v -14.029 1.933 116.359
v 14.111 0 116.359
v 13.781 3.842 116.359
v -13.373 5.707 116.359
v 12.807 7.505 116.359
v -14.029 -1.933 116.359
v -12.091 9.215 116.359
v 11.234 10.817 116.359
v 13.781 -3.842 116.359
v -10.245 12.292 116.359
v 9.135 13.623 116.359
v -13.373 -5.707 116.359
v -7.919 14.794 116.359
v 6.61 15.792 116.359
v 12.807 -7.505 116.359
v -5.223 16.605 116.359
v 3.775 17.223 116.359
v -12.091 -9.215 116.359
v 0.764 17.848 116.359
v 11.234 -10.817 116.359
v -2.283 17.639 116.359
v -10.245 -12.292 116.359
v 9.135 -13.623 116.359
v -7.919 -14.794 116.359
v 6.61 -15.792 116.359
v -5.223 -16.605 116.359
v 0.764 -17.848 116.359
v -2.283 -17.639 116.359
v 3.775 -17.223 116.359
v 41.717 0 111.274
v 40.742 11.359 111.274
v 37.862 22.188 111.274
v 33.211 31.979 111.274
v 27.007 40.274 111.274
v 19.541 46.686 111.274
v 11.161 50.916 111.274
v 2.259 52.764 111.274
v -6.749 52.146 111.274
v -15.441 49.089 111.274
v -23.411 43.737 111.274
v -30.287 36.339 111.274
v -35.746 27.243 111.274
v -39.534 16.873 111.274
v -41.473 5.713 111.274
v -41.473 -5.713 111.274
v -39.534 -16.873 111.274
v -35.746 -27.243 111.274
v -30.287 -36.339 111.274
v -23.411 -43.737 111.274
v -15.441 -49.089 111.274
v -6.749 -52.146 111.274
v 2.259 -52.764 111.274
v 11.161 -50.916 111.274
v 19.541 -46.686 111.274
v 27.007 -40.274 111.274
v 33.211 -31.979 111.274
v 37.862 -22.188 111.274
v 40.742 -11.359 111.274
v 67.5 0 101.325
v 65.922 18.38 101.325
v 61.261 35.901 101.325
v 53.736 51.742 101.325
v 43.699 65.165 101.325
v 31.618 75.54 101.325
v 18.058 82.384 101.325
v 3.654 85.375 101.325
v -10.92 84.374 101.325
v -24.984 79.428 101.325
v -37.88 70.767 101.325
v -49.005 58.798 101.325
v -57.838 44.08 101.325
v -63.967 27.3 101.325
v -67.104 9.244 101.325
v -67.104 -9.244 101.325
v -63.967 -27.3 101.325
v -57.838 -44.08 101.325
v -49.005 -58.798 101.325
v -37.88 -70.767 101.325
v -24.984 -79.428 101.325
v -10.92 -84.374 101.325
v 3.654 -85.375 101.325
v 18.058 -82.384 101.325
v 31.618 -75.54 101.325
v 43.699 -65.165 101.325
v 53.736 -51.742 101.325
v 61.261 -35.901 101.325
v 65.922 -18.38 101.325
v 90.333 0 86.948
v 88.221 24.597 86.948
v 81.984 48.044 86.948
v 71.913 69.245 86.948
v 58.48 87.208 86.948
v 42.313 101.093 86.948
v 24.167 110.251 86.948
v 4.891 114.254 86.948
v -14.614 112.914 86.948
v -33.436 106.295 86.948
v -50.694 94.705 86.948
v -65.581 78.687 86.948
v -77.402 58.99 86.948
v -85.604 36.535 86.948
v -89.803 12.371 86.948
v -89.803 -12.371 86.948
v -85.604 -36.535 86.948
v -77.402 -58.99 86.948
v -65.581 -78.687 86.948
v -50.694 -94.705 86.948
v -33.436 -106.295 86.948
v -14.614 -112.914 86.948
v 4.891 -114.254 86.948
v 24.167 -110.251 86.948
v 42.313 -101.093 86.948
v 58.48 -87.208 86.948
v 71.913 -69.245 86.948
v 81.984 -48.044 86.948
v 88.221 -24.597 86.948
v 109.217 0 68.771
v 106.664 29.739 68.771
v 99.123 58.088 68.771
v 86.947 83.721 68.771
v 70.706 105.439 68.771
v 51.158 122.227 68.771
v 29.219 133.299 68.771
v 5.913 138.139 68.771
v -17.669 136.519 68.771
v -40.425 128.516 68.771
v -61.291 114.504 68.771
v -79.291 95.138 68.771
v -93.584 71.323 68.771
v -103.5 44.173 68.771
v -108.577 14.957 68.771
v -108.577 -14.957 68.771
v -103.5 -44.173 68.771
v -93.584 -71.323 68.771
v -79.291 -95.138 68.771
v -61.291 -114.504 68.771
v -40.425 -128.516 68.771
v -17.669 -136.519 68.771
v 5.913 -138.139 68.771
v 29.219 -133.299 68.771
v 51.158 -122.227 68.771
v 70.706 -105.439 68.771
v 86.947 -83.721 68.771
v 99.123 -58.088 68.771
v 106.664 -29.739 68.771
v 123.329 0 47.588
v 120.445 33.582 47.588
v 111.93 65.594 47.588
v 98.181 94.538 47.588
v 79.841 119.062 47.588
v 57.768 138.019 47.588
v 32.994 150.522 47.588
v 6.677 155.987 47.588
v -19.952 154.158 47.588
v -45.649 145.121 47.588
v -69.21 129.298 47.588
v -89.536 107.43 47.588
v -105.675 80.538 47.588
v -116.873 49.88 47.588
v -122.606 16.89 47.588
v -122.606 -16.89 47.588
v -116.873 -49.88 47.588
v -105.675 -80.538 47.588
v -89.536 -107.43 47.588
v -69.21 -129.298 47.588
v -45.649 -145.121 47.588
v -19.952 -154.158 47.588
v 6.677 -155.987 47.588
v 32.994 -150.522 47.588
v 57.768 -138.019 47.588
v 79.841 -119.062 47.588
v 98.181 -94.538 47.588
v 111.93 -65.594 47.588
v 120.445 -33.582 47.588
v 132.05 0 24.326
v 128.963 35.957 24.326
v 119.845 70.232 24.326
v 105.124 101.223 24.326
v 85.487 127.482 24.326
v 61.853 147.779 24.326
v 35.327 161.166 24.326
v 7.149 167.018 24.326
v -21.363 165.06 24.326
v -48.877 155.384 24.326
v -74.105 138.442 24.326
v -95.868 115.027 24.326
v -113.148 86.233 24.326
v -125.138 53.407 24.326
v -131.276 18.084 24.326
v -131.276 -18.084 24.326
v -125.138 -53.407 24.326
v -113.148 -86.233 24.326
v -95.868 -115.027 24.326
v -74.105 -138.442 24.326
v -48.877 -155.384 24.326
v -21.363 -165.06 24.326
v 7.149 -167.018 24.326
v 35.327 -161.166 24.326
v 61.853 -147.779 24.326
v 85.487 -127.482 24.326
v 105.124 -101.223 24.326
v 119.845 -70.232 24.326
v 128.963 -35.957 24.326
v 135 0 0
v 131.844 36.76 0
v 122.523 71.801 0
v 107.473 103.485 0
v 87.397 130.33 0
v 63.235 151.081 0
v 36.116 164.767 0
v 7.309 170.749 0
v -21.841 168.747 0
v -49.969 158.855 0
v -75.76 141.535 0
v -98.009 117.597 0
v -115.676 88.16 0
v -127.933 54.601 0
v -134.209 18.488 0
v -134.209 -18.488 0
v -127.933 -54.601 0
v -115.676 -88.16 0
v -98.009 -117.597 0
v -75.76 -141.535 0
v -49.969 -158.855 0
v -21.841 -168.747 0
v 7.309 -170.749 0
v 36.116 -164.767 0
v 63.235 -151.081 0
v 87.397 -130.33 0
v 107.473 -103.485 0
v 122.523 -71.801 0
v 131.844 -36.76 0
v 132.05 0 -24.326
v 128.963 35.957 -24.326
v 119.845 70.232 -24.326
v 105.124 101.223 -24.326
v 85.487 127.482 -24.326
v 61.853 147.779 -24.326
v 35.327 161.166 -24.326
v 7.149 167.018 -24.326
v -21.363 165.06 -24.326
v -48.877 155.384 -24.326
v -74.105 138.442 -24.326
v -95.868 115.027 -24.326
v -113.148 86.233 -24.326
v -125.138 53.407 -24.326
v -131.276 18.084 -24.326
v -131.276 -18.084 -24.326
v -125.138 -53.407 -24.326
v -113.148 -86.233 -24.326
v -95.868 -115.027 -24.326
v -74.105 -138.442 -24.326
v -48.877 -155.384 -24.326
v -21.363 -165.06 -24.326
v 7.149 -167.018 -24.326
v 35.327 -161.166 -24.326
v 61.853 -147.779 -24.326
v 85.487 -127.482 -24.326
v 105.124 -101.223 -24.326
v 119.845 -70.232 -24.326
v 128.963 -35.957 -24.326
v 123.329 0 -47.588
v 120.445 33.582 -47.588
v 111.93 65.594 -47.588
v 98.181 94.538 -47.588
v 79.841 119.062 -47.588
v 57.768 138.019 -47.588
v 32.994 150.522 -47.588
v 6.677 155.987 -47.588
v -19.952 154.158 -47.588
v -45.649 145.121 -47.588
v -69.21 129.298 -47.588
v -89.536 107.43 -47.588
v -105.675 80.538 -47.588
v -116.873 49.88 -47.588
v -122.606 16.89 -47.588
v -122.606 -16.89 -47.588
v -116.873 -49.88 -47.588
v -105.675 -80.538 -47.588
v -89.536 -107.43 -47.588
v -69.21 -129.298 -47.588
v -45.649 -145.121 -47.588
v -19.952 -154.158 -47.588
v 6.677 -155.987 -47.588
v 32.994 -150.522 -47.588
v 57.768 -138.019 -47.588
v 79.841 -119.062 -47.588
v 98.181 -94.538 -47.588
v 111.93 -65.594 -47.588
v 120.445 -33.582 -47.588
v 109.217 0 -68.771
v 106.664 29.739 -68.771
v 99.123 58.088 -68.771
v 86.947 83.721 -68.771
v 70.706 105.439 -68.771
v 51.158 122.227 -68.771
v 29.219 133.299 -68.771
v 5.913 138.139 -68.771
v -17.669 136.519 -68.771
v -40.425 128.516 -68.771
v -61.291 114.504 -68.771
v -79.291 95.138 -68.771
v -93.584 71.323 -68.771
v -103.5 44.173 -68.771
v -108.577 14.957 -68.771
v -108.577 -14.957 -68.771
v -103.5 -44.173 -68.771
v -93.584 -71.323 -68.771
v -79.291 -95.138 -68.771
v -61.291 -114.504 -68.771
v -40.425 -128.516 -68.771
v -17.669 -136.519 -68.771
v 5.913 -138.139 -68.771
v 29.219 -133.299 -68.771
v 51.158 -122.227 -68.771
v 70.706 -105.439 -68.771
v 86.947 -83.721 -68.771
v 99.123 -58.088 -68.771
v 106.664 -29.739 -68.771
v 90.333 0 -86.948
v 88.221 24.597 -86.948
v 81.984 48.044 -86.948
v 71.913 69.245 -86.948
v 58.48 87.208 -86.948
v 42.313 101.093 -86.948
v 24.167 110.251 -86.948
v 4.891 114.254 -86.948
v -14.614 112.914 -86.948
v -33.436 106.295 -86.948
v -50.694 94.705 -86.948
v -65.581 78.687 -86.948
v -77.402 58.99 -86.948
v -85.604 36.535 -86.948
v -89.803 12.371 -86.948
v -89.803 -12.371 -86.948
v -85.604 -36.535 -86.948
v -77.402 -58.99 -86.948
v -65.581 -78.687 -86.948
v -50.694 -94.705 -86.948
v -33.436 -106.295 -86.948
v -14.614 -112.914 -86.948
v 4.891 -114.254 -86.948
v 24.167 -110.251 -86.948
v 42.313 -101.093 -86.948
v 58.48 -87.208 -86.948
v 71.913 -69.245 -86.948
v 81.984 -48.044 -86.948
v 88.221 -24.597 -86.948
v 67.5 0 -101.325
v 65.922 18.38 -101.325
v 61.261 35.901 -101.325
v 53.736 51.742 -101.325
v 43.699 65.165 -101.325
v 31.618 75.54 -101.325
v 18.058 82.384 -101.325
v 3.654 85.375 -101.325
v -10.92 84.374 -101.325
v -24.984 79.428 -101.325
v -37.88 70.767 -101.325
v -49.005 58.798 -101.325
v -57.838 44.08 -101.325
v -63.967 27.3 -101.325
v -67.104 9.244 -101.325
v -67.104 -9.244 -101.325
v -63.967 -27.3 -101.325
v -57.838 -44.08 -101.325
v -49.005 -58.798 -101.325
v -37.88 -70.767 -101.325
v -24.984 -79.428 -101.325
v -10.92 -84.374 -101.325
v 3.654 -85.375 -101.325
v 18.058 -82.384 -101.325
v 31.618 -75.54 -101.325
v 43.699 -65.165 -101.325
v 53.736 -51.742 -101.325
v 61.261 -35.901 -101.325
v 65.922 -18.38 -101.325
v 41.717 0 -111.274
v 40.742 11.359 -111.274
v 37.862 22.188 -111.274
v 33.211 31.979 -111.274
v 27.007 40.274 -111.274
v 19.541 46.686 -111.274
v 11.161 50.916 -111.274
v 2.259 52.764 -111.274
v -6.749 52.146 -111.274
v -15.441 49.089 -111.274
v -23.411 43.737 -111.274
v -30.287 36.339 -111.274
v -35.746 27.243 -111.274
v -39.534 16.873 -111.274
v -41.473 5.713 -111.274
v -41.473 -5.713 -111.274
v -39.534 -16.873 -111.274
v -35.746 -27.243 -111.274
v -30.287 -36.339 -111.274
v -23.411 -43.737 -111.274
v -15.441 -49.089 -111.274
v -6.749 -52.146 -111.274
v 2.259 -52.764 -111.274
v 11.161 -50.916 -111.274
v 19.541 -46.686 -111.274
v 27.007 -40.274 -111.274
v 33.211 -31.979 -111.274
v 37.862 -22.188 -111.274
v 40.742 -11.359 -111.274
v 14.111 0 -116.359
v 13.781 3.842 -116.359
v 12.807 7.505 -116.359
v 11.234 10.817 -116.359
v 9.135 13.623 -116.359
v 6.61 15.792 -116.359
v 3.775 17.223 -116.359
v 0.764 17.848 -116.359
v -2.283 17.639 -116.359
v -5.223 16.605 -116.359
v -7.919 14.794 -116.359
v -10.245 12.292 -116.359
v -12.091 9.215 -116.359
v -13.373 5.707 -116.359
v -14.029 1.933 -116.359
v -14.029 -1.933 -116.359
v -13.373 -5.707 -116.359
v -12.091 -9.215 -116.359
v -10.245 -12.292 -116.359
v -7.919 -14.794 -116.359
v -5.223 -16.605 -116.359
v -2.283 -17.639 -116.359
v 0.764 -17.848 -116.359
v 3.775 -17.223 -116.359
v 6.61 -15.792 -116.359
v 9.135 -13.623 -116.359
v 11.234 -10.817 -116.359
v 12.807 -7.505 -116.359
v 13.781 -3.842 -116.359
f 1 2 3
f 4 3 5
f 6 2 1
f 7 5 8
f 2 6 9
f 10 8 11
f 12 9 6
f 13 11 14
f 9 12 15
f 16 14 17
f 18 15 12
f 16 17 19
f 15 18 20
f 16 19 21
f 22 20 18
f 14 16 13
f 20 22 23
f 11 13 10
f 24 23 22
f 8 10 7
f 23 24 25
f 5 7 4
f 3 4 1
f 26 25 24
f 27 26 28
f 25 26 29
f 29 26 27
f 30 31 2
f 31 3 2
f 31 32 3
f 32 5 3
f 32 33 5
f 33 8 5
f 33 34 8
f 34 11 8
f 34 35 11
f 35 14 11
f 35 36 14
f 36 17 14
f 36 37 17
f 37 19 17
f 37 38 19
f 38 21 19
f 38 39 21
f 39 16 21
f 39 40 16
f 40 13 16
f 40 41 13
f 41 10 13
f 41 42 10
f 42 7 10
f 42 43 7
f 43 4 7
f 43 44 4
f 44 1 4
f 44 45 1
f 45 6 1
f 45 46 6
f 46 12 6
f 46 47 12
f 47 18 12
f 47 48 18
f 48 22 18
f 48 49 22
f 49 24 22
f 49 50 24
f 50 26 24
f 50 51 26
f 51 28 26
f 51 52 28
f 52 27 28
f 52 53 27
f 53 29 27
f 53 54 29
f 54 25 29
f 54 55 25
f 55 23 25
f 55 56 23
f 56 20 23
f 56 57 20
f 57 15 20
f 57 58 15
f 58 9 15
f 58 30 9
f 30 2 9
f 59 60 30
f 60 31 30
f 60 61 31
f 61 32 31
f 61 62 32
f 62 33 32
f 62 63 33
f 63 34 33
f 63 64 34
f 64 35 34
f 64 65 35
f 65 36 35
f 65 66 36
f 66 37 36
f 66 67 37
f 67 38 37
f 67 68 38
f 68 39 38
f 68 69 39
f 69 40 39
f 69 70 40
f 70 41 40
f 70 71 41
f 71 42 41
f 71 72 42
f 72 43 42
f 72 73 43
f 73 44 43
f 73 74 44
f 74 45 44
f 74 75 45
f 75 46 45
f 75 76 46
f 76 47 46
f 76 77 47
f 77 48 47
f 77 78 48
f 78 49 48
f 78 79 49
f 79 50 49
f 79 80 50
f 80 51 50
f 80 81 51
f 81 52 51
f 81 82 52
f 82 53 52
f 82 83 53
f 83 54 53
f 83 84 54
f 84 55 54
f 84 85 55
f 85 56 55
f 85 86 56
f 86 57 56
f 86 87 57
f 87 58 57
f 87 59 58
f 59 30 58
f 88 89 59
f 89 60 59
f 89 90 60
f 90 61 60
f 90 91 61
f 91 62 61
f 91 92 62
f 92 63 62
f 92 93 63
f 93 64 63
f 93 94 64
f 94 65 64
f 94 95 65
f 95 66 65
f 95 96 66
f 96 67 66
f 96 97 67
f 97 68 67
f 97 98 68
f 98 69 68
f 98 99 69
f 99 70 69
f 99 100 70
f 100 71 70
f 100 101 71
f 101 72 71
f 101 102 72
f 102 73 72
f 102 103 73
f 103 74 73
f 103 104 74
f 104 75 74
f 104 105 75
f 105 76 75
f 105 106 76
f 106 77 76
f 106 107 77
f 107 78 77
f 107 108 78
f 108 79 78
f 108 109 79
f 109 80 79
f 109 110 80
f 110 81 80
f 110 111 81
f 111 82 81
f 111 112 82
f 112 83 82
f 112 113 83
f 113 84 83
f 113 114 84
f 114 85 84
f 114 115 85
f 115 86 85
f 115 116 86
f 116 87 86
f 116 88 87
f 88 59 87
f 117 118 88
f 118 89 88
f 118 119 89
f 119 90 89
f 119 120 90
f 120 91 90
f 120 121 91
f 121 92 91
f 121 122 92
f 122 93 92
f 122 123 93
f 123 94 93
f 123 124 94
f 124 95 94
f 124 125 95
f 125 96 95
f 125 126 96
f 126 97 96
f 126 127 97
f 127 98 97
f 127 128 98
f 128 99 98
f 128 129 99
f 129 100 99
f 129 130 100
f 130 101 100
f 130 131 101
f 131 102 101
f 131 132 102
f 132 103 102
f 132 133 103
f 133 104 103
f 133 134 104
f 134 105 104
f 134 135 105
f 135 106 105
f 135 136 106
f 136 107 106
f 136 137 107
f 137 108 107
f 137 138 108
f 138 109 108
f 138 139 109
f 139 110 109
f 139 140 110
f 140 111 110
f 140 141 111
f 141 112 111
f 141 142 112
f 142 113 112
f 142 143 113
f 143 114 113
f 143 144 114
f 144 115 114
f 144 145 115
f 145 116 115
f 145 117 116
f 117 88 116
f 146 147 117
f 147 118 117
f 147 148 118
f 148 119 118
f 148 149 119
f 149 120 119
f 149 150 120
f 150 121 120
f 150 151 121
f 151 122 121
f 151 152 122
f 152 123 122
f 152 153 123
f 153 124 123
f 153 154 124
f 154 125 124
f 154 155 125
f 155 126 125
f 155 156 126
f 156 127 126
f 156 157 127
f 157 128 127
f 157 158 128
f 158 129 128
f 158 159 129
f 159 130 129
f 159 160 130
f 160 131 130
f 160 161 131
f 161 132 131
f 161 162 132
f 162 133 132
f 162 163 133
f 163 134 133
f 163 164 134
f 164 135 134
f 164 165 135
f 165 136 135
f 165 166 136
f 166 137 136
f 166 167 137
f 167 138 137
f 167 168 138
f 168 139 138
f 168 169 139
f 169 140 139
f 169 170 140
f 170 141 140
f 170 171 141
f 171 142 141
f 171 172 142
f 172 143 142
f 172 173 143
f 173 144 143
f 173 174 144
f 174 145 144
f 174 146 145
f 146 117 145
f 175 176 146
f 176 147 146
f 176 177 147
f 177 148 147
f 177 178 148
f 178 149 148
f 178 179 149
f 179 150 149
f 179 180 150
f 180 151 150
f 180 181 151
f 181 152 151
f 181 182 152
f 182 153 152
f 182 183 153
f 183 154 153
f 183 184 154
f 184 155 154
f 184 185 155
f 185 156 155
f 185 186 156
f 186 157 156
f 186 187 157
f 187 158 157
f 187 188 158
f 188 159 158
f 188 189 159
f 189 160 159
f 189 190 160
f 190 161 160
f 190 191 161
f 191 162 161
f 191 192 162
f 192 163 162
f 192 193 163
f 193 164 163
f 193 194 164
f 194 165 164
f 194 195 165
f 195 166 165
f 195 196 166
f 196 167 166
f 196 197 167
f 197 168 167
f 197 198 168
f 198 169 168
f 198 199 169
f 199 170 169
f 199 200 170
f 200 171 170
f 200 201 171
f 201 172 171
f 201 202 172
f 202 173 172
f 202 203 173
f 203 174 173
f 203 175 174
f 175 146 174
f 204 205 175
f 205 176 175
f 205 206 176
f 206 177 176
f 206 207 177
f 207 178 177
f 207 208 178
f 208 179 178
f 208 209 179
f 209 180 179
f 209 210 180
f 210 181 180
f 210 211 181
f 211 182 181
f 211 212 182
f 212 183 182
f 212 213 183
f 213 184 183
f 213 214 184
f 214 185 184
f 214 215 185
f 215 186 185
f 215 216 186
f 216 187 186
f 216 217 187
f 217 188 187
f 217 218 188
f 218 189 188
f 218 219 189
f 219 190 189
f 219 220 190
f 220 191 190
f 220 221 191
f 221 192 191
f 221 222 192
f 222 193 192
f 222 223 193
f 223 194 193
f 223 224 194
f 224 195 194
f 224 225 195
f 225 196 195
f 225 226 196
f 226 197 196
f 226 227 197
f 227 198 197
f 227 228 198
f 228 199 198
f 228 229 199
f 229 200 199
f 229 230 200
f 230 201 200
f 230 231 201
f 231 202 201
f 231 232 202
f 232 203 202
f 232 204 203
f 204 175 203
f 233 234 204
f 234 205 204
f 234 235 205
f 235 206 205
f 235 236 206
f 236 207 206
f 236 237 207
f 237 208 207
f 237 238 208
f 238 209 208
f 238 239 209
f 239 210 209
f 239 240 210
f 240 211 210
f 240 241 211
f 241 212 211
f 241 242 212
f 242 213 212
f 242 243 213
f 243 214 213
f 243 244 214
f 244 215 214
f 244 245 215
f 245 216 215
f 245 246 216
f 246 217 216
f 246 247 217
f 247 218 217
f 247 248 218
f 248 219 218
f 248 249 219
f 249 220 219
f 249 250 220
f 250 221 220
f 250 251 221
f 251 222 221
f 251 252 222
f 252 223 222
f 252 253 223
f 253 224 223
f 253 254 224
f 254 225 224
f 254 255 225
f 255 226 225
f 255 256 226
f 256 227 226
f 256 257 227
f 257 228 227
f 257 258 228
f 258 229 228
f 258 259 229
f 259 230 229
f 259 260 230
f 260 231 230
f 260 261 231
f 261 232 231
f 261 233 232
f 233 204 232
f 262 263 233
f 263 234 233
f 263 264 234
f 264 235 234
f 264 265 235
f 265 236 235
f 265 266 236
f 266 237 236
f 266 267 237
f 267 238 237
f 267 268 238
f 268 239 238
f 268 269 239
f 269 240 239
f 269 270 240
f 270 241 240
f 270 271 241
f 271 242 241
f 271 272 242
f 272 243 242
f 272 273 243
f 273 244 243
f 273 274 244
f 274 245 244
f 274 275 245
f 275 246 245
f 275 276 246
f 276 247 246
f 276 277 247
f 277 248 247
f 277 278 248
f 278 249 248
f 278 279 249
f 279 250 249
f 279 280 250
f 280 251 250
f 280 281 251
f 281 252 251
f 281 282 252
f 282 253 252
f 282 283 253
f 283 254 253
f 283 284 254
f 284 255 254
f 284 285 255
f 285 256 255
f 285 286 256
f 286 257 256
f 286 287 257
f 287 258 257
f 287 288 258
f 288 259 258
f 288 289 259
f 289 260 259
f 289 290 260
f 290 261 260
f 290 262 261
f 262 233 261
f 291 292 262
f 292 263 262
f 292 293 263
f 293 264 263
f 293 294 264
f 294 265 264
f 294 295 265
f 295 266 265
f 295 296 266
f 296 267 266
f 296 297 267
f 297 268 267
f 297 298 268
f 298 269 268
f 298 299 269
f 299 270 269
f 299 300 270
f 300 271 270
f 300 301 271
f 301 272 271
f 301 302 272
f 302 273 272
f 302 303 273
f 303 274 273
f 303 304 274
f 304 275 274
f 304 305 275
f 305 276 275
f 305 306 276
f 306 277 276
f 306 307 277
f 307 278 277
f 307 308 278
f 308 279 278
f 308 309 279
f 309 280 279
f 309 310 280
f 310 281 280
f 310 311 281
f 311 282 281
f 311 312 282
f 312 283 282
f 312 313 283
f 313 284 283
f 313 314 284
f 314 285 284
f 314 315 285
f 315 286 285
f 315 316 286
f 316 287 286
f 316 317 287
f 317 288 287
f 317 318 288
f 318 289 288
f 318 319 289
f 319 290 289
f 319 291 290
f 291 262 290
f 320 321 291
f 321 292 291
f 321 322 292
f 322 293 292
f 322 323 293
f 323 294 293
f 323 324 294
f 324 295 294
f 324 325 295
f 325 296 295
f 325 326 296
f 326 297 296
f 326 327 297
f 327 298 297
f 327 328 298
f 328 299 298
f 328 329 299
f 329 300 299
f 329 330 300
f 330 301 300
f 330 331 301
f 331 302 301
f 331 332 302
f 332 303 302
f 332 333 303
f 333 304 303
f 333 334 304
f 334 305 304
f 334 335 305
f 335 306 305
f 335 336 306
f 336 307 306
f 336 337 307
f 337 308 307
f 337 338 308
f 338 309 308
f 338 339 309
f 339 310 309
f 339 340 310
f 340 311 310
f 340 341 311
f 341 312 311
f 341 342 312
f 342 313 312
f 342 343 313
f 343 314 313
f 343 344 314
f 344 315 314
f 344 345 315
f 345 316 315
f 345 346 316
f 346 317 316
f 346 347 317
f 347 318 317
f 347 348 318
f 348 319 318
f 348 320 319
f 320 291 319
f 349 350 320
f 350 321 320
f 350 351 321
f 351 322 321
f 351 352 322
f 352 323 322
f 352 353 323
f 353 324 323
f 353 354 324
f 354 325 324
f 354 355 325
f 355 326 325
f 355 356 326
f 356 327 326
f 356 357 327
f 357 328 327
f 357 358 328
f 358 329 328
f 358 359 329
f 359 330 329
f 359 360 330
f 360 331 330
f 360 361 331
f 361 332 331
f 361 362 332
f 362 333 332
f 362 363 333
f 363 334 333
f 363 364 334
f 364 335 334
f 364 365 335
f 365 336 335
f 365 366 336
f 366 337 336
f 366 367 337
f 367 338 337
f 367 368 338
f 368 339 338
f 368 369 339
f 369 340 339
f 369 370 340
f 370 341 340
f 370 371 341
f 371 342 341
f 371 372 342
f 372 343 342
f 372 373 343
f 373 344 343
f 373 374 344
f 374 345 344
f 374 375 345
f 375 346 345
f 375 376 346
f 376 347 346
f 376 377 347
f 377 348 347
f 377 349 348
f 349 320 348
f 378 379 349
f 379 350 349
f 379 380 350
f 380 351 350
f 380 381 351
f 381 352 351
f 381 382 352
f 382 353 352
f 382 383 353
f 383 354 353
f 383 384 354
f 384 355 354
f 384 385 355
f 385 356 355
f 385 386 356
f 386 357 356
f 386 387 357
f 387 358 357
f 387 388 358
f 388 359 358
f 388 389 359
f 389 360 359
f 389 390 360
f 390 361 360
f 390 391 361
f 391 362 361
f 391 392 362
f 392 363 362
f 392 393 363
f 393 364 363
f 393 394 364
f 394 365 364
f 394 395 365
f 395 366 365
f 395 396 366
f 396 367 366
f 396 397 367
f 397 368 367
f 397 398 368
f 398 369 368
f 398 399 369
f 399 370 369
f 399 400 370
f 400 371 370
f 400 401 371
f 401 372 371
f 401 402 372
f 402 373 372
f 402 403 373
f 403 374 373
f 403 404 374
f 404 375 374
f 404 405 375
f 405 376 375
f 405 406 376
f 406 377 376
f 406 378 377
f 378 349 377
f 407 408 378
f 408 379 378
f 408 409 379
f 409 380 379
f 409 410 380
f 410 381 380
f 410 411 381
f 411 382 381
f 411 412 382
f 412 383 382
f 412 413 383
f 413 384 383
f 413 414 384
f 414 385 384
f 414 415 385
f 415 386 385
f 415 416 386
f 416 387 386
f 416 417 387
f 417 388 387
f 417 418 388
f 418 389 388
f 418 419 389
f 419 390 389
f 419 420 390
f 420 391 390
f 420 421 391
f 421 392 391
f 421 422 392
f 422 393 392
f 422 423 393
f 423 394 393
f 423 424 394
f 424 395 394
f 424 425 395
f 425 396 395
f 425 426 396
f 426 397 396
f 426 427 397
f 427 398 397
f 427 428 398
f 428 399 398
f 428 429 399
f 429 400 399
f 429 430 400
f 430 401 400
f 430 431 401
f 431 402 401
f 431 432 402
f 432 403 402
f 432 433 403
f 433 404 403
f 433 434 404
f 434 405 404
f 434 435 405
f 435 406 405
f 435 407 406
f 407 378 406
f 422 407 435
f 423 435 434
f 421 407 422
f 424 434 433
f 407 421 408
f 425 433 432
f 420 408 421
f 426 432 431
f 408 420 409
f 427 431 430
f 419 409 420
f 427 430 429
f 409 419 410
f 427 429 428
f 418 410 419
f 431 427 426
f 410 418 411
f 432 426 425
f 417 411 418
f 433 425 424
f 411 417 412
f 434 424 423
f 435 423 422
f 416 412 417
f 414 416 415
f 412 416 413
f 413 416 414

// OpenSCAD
// Generated by SolidPython 1.0.1 on 2020-07-29 00:46:52


scale(v = [15, 19, 13]) {
	sphere(r = 9);
}
/***********************************************
*********      SolidPython code:      **********
************************************************
 
# import packages: SolidPython
from solid import *
from solid.utils import *
from itertools import chain, combinations, permutations


class Resize:

    def __init__(self, scad_file):
        self.scad_file = scad_file
        #self.scad_file = import_scad(scad_file)
        # cone/cylinder param:
        self.r1 = 0
        self.r2 = 0
        self.h = 0
        # rectangular prism param:
        self.w = 0
        self.l = 0
        # ellipse param:
        self.r = 0

    # import OpenScad code (file name corresponds to shape)


    # classify shape + parameters
    def assign(self, param1, param2, param3):
        if self.scad_file == 'cone.scad':
            self.r1 = param1
            self.r2 = param2
            self.h = param3
        elif self.scad_file == 'cylinder.scad':
            self.r1 = param1
            self.r2 = param2
            self.h = param3
        elif self.scad_file == 'rectangularPrism.scad':
            self.h = param1
            self.l = param2
            self.w = param3
        else:
            self.r = param1
            self.h = param2

    # resize parameters
    def iterate(self):
        x = range(3, 20, 2)
        i = 1
        if self.scad_file == 'cone.scad':
            tempList = list(permutations(x, 2))
            for temp in tempList:
                param1 = temp[0]
                param2 = temp[1]
                filepath = 'produced_scad_files/' + 'cone' + str(param1) + '_' + str(param2) + '_' + '.scad'
                scad_render_to_file(cylinder(h=param1, r1=param2, r2=0), filepath)

        elif self.scad_file == 'cylinder.scad':
            tempList = list(permutations(x, 3))
            for temp in tempList:
                param1 = temp[0]
                param2 = temp[1]
                filepath = 'produced_scad_files/' + 'cylinder' + str(param1) + '_' + str(param2) + '_' + '.scad'
                scad_render_to_file(cylinder(h=param1, r1=param2, r2=param2), filepath)

        elif self.scad_file == 'rectangularPrism.scad':
            tempList = list(permutations(x, 3))
            for temp in tempList:
                param1 = temp[0]
                param2 = temp[1]
                param3 = temp[2]
                filepath = 'produced_scad_files/' + 'rectangularPrism' + str(param1) + '_' + str(param2) + '_' + str(
                    param3) + '.scad'
                scad_render_to_file(cube(size=(param1, param2, param3)), filepath)

        elif self.scad_file == 'ellipse.scad':
            tempList = list(permutations(x, 4))
            for temp in tempList:
                param1 = temp[0]
                param2 = temp[1]
                param3 = temp[2]
                param4 = temp[3]
                filepath = 'produced_scad_files/' + 'ellipse' + str(param1) + '_' + str(param2) + '_' + str(param3) + '_' + str(param4) + '.scad'
                scad_render_to_file(scale([param1, param2, param3])(sphere(r=param4)), filepath)

    def render_to_scadfile(self):
        scad_render_to_file(scad, 'example.scad') 
 
************************************************/
